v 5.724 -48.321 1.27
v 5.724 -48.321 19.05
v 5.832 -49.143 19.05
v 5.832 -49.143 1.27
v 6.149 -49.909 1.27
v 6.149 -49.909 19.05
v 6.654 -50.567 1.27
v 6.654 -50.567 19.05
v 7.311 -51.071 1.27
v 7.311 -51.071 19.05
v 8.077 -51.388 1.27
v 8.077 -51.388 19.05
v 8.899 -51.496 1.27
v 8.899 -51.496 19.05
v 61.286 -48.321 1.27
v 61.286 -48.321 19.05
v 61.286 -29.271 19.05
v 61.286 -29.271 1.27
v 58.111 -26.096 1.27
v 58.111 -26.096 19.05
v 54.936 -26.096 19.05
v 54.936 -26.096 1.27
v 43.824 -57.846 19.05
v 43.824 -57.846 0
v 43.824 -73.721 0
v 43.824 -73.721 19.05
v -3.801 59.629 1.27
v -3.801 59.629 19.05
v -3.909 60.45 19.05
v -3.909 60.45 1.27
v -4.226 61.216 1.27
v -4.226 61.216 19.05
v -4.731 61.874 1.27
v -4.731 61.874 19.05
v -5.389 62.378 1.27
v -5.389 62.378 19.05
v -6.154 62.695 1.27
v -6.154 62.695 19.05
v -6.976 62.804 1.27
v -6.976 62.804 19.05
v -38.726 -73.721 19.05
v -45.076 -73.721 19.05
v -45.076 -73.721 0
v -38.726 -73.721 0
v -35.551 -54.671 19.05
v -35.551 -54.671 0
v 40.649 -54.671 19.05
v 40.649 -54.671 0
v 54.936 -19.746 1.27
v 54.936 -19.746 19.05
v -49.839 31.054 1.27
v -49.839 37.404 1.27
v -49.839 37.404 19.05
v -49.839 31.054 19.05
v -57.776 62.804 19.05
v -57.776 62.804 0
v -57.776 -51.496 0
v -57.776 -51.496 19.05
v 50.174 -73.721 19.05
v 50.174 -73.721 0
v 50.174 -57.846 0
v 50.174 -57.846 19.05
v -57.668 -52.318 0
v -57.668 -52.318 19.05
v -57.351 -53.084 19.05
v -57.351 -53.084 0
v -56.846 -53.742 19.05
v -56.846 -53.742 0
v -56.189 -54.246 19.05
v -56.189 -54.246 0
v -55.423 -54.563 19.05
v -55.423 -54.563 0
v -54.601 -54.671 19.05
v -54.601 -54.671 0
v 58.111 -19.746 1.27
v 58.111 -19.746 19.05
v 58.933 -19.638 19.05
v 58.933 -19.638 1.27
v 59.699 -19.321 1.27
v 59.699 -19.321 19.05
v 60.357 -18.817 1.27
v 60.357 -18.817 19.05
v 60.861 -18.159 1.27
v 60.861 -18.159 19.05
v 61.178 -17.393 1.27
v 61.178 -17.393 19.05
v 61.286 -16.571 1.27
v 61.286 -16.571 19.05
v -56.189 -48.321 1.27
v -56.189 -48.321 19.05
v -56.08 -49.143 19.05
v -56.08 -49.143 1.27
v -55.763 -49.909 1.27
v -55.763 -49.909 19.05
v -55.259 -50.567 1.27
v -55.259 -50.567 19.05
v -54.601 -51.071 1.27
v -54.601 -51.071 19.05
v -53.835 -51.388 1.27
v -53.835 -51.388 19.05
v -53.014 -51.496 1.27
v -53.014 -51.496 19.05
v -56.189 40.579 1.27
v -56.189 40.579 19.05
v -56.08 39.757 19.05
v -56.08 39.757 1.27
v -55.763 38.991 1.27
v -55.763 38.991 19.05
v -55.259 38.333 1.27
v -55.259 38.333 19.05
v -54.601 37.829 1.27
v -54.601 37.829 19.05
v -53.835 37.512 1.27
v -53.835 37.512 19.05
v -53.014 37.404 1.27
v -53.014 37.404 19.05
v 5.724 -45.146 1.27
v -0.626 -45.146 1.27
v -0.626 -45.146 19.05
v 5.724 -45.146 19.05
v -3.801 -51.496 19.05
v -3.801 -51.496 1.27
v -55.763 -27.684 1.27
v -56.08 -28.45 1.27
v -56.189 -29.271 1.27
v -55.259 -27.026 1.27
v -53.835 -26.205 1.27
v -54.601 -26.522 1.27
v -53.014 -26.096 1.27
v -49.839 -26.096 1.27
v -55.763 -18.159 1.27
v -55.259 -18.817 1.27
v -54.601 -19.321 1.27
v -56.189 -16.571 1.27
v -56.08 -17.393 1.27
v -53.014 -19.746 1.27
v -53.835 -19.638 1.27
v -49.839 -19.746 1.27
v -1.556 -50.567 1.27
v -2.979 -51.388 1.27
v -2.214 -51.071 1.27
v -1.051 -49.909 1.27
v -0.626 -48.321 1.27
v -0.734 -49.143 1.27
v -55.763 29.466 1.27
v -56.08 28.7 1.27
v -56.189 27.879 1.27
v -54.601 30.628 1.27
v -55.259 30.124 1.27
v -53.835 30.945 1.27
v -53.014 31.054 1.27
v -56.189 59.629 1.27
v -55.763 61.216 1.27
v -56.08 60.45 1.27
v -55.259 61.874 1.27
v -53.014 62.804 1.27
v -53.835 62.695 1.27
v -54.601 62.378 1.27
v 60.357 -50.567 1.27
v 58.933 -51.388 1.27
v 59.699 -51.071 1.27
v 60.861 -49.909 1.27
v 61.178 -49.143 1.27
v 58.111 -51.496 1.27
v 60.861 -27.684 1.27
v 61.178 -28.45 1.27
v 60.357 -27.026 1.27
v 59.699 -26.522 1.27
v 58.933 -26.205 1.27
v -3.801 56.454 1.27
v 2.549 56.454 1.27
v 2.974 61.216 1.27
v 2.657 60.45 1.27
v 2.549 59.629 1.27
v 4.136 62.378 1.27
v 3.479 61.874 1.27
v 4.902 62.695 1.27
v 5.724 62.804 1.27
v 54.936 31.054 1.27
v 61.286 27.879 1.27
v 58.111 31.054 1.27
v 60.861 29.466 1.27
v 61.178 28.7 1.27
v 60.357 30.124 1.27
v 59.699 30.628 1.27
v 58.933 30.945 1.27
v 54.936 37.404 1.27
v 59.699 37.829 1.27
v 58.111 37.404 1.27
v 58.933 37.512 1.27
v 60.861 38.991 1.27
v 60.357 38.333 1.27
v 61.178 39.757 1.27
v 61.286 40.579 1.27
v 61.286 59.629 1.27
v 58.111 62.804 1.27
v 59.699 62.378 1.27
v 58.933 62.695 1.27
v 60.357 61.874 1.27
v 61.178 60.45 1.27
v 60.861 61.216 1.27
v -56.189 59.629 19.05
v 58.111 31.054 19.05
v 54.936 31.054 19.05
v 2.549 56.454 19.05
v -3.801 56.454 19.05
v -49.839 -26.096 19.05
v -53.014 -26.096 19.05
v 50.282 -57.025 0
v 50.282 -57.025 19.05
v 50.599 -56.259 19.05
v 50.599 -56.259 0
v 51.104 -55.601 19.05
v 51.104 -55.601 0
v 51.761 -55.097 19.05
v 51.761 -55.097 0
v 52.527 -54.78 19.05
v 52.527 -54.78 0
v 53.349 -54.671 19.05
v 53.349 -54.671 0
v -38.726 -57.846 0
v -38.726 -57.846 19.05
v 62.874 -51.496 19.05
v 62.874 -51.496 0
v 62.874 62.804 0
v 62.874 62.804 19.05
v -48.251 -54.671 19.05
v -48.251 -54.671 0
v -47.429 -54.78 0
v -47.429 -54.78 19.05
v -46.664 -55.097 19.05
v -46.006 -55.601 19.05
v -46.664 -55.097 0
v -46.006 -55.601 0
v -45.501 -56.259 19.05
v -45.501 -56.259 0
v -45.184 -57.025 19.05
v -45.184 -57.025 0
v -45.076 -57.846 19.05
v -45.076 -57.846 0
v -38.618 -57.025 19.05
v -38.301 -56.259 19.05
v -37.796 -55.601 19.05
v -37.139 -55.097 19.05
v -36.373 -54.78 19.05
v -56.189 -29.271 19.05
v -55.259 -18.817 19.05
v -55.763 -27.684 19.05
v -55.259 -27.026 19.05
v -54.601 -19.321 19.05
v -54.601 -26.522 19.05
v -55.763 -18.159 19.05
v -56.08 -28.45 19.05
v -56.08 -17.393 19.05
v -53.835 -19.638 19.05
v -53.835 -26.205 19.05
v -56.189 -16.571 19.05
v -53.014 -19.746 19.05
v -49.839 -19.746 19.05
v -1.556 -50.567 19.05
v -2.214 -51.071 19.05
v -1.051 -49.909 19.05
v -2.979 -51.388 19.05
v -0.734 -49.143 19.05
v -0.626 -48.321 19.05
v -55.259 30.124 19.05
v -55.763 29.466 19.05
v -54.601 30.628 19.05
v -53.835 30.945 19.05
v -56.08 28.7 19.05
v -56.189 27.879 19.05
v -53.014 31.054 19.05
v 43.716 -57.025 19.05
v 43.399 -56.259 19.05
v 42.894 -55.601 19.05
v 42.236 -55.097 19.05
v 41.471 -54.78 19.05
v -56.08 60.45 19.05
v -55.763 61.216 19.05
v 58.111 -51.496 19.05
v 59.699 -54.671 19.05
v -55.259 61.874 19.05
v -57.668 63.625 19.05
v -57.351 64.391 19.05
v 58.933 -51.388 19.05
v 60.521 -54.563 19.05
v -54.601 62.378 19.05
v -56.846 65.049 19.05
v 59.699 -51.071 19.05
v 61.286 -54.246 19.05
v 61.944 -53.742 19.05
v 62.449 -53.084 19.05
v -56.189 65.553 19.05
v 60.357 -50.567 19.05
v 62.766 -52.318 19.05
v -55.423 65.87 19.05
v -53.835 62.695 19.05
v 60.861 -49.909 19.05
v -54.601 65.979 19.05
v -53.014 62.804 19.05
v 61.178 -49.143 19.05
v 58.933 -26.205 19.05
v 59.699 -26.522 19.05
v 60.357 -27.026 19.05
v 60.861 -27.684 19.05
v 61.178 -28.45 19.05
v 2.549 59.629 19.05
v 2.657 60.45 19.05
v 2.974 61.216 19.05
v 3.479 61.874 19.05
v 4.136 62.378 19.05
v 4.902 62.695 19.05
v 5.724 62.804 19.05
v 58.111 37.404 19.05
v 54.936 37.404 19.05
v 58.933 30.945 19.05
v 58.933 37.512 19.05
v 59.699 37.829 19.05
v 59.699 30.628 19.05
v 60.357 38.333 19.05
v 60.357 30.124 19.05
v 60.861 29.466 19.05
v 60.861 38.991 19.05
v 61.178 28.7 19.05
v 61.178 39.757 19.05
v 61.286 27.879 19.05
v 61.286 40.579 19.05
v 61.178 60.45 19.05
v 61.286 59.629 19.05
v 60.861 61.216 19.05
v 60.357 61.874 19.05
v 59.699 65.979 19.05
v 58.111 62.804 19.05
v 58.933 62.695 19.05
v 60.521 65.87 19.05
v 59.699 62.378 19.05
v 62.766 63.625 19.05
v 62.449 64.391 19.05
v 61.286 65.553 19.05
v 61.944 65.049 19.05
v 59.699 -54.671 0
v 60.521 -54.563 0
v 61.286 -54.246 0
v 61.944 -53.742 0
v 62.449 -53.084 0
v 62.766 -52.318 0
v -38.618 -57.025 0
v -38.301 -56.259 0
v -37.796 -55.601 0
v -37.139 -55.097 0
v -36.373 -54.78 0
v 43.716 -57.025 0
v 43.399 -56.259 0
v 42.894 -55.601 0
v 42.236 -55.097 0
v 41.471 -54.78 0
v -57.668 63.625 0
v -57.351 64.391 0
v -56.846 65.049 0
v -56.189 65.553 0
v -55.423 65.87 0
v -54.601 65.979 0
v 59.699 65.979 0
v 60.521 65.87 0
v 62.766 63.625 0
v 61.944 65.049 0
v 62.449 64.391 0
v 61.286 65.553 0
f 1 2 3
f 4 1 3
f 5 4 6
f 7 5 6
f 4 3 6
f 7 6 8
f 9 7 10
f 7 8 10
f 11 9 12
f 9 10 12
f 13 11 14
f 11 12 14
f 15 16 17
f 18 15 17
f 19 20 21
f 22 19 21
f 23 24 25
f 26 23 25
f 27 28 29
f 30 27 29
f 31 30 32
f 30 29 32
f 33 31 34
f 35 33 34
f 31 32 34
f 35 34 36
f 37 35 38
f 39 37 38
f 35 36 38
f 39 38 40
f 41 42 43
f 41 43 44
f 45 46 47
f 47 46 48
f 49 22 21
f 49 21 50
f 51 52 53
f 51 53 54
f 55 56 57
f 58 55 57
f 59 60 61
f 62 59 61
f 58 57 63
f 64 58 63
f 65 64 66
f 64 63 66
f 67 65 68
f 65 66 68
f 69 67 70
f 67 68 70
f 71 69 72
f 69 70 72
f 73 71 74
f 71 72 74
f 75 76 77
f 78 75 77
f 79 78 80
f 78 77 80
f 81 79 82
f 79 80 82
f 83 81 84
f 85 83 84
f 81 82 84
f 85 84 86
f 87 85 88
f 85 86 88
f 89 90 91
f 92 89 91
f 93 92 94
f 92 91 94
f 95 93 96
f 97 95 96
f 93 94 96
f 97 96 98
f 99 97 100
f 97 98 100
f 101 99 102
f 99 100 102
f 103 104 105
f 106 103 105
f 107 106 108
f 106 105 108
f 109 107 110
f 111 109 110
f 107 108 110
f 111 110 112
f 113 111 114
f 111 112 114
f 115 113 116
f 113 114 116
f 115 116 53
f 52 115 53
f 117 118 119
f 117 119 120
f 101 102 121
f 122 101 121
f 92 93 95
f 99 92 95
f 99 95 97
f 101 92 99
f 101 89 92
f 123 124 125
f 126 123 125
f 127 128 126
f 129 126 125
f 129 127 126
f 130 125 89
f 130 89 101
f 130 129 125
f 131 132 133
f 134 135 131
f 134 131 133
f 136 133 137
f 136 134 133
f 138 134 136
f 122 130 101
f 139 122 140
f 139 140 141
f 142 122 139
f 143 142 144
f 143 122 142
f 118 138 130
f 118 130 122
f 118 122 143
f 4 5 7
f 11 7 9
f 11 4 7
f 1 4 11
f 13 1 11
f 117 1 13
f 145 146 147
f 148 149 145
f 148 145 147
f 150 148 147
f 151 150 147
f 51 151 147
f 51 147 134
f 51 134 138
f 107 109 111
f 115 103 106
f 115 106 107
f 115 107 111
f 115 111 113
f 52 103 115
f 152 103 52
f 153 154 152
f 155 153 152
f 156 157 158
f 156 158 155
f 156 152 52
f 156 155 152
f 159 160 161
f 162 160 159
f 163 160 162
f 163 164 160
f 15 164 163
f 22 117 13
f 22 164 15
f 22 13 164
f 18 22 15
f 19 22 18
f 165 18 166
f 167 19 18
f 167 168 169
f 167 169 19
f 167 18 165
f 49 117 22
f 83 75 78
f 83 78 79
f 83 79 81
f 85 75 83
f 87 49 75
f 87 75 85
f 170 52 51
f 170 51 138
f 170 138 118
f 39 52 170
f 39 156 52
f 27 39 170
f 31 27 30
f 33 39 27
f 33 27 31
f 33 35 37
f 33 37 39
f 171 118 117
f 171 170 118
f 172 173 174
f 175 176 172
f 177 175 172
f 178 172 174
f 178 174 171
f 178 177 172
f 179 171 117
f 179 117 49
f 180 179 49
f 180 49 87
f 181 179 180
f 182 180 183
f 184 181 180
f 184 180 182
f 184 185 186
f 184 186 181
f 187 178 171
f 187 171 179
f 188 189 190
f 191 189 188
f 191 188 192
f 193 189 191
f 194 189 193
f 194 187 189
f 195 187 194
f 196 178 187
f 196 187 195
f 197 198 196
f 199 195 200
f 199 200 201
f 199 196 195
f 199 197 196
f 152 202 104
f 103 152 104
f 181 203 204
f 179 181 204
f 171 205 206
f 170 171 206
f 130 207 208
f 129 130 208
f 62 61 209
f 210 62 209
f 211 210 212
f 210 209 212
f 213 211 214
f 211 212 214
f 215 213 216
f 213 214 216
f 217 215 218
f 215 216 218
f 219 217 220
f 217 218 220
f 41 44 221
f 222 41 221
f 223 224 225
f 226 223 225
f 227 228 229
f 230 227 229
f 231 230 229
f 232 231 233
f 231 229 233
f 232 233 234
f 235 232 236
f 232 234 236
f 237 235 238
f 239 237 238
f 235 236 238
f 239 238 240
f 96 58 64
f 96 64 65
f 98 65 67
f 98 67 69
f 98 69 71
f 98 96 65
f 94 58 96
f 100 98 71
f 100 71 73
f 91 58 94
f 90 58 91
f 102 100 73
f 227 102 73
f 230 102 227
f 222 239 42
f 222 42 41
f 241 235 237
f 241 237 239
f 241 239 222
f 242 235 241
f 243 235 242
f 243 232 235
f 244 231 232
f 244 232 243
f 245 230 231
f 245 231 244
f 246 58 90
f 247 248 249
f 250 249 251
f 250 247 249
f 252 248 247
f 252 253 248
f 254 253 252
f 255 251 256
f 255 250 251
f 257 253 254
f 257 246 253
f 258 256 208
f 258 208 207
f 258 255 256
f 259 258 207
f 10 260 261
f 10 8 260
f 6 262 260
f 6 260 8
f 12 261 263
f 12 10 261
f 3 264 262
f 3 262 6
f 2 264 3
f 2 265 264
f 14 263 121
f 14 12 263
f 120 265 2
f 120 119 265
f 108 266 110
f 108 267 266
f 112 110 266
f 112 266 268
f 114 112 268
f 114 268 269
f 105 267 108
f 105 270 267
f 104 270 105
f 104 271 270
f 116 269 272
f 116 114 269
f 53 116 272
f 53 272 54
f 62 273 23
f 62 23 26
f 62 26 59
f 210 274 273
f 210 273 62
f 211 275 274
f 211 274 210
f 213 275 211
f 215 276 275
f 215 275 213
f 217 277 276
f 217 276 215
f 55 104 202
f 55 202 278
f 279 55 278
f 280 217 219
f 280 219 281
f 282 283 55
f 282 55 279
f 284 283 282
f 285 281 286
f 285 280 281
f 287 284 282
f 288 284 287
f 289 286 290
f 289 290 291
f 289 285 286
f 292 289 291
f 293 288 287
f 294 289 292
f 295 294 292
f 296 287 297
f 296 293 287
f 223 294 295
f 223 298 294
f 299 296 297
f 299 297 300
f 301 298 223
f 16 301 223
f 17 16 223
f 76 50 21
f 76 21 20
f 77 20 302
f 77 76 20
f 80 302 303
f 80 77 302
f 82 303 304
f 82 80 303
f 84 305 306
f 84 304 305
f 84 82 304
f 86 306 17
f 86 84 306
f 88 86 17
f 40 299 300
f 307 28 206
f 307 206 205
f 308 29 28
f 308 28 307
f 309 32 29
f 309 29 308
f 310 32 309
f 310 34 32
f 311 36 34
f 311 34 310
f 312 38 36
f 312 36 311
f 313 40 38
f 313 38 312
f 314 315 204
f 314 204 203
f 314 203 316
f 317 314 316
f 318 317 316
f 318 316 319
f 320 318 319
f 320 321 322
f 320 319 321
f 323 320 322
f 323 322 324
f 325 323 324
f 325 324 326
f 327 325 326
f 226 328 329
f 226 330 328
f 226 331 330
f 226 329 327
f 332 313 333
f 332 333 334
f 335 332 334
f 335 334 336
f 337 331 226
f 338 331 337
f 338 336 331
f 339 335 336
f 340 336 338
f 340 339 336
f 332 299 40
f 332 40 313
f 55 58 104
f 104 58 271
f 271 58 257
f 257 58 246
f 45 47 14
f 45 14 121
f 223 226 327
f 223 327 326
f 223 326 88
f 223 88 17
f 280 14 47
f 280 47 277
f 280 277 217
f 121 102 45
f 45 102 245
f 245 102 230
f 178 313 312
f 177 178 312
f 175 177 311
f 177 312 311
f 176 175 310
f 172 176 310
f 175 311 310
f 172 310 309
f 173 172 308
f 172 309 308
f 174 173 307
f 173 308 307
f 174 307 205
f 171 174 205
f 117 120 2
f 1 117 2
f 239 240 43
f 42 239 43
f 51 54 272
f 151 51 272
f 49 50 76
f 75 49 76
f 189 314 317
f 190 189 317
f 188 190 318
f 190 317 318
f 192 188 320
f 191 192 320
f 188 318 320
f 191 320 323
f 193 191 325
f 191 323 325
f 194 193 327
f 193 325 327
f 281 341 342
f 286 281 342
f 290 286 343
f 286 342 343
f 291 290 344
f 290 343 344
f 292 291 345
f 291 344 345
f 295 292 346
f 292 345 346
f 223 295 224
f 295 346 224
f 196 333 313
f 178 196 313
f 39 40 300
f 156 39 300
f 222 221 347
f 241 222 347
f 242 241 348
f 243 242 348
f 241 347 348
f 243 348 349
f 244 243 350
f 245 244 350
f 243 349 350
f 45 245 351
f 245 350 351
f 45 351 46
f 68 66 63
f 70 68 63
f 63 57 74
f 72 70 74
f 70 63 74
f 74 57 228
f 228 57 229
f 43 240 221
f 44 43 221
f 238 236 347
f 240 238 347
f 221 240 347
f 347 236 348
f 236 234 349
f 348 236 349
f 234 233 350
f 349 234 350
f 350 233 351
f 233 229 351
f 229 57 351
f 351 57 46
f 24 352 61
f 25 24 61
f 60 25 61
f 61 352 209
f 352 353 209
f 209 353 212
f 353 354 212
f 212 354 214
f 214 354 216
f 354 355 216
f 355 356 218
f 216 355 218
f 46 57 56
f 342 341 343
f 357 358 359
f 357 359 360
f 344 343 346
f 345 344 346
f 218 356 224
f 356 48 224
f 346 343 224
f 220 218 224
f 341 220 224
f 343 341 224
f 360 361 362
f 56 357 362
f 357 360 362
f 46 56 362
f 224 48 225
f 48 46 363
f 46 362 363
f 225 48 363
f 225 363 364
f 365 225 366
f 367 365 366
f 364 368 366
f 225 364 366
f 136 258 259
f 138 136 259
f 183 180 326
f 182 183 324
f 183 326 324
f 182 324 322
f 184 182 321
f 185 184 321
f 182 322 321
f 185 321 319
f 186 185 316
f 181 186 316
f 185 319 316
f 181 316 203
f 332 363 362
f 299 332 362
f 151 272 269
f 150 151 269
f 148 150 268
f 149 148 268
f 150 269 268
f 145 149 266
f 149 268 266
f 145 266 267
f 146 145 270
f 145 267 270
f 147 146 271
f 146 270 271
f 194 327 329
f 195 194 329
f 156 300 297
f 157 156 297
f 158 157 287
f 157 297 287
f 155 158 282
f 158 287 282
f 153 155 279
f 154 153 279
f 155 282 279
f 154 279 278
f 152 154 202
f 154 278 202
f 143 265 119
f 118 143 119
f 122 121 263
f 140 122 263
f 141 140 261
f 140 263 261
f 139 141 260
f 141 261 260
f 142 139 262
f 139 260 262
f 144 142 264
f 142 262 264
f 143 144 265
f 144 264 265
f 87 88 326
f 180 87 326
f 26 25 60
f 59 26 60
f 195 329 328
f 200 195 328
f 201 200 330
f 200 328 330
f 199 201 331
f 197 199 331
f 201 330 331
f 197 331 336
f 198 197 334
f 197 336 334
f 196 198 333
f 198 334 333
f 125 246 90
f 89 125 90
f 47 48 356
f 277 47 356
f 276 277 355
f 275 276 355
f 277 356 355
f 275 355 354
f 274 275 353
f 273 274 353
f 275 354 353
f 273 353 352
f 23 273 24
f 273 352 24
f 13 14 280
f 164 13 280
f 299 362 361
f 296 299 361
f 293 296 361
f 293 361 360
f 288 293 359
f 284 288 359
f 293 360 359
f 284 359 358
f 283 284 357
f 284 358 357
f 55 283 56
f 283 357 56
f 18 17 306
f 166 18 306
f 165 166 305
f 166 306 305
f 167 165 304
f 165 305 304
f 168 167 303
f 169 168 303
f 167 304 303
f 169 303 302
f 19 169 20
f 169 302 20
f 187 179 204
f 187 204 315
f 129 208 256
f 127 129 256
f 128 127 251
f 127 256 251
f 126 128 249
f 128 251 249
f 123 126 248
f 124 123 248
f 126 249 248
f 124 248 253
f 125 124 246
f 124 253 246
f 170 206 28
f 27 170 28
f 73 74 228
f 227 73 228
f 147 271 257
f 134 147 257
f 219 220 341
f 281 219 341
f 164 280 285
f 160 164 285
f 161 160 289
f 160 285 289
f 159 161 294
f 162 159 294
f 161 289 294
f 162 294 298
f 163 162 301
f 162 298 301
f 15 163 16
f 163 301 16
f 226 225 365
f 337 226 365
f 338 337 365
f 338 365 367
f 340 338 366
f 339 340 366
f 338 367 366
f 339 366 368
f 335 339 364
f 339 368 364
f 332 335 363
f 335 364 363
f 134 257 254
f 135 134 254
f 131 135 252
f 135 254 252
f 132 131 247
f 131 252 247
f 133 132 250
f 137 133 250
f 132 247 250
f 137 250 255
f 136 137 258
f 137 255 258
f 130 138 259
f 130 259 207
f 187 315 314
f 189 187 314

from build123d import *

# Parameters (mm, degrees)
F1_DEPTH = 19.05
F3_DEPTH = 17.78


with BuildPart() as f1:
    # F0 (on Top) → F1 (new body)
    with BuildSketch(Plane.XY):
        with BuildLine():
            Line((59.698993, 65.978541), (-54.601007, 65.978541))
            ThreePointArc((-54.601007, 65.978541), (-56.846071, 65.048605), (-57.776007, 62.803541))
            Line((-57.776007, 62.803541), (-57.776007, -51.496459))
            ThreePointArc((-57.776007, -51.496459), (-56.846071, -53.741523), (-54.601007, -54.671459))
            Line((-54.601007, -54.671459), (-48.251007, -54.671459))
            ThreePointArc((-48.251007, -54.671459), (-46.005943, -55.601395), (-45.076007, -57.846459))
            Line((-45.076007, -57.846459), (-45.076007, -73.721459))
            Line((-45.076007, -73.721459), (-38.726007, -73.721459))
            Line((-38.726007, -73.721459), (-38.726007, -57.846459))
            ThreePointArc((-38.726007, -57.846459), (-37.796071, -55.601395), (-35.551007, -54.671459))
            Line((-35.551007, -54.671459), (40.648993, -54.671459))
            ThreePointArc((40.648993, -54.671459), (42.894057, -55.601395), (43.823993, -57.846459))
            Line((43.823993, -57.846459), (43.823993, -73.721459))
            Line((43.823993, -73.721459), (50.173993, -73.721459))
            Line((50.173993, -73.721459), (50.173993, -57.846459))
            ThreePointArc((50.173993, -57.846459), (51.103929, -55.601395), (53.348993, -54.671459))
            Line((53.348993, -54.671459), (59.698993, -54.671459))
            ThreePointArc((59.698993, -54.671459), (61.944057, -53.741523), (62.873993, -51.496459))
            Line((62.873993, -51.496459), (62.873993, 62.803541))
            ThreePointArc((62.873993, 62.803541), (61.944057, 65.048605), (59.698993, 65.978541))
        make_face()
    extrude(amount=F1_DEPTH)

    # F2 (on face) → F3 (cut)
    with BuildSketch(Plane.XY.offset(19.05)):
        with BuildLine():
            Line((-6.976007, 62.803541), (-53.013507, 62.803541))
            ThreePointArc((-53.013507, 62.803541), (-55.258571, 61.873605), (-56.188507, 59.628541))
            Line((-56.188507, 59.628541), (-56.188507, 40.578541))
            ThreePointArc((-56.188507, 40.578541), (-55.258571, 38.333477), (-53.013507, 37.403541))
            Line((-53.013507, 37.403541), (-49.838507, 37.403541))
            Line((-49.838507, 37.403541), (-49.838507, 31.053541))
            Line((-49.838507, 31.053541), (-53.013507, 31.053541))
            ThreePointArc((-53.013507, 31.053541), (-55.258571, 30.123605), (-56.188507, 27.878541))
            Line((-56.188507, 27.878541), (-56.188507, -16.571459))
            ThreePointArc((-56.188507, -16.571459), (-55.258571, -18.816523), (-53.013507, -19.746459))
            Line((-53.013507, -19.746459), (-49.838507, -19.746459))
            Line((-49.838507, -19.746459), (-49.838507, -26.096459))
            Line((-49.838507, -26.096459), (-53.013507, -26.096459))
            ThreePointArc((-53.013507, -26.096459), (-55.258571, -27.026395), (-56.188507, -29.271459))
            Line((-56.188507, -29.271459), (-56.188507, -48.321459))
            ThreePointArc((-56.188507, -48.321459), (-55.258571, -50.566523), (-53.013507, -51.496459))
            Line((-53.013507, -51.496459), (-3.801007, -51.496459))
            ThreePointArc((-3.801007, -51.496459), (-1.555943, -50.566523), (-0.626007, -48.321459))
            Line((-0.626007, -48.321459), (-0.626007, -45.146459))
            Line((-0.626007, -45.146459), (5.723993, -45.146459))
            Line((5.723993, -45.146459), (5.723993, -48.321459))
            ThreePointArc((5.723993, -48.321459), (6.653929, -50.566523), (8.898993, -51.496459))
            Line((8.898993, -51.496459), (58.111493, -51.496459))
            ThreePointArc((58.111493, -51.496459), (60.356557, -50.566523), (61.286493, -48.321459))
            Line((61.286493, -48.321459), (61.286493, -29.271459))
            ThreePointArc((61.286493, -29.271459), (60.356557, -27.026395), (58.111493, -26.096459))
            Line((58.111493, -26.096459), (54.936493, -26.096459))
            Line((54.936493, -26.096459), (54.936493, -19.746459))
            Line((54.936493, -19.746459), (58.111493, -19.746459))
            ThreePointArc((58.111493, -19.746459), (60.356557, -18.816523), (61.286493, -16.571459))
            Line((61.286493, -16.571459), (61.286493, 27.878541))
            ThreePointArc((61.286493, 27.878541), (60.356557, 30.123605), (58.111493, 31.053541))
            Line((58.111493, 31.053541), (54.936493, 31.053541))
            Line((54.936493, 31.053541), (54.936493, 37.403541))
            Line((54.936493, 37.403541), (58.111493, 37.403541))
            ThreePointArc((58.111493, 37.403541), (60.356557, 38.333477), (61.286493, 40.578541))
            Line((61.286493, 40.578541), (61.286493, 59.628541))
            ThreePointArc((61.286493, 59.628541), (60.356557, 61.873605), (58.111493, 62.803541))
            Line((58.111493, 62.803541), (5.723993, 62.803541))
            ThreePointArc((5.723993, 62.803541), (3.478929, 61.873605), (2.548993, 59.628541))
            Line((2.548993, 59.628541), (2.548993, 56.453541))
            Line((2.548993, 56.453541), (-3.801007, 56.453541))
            Line((-3.801007, 56.453541), (-3.801007, 59.628541))
            ThreePointArc((-3.801007, 59.628541), (-4.730943, 61.873605), (-6.976007, 62.803541))
        make_face()
    extrude(amount=-F3_DEPTH, mode=Mode.SUBTRACT)


solid = f1.part
